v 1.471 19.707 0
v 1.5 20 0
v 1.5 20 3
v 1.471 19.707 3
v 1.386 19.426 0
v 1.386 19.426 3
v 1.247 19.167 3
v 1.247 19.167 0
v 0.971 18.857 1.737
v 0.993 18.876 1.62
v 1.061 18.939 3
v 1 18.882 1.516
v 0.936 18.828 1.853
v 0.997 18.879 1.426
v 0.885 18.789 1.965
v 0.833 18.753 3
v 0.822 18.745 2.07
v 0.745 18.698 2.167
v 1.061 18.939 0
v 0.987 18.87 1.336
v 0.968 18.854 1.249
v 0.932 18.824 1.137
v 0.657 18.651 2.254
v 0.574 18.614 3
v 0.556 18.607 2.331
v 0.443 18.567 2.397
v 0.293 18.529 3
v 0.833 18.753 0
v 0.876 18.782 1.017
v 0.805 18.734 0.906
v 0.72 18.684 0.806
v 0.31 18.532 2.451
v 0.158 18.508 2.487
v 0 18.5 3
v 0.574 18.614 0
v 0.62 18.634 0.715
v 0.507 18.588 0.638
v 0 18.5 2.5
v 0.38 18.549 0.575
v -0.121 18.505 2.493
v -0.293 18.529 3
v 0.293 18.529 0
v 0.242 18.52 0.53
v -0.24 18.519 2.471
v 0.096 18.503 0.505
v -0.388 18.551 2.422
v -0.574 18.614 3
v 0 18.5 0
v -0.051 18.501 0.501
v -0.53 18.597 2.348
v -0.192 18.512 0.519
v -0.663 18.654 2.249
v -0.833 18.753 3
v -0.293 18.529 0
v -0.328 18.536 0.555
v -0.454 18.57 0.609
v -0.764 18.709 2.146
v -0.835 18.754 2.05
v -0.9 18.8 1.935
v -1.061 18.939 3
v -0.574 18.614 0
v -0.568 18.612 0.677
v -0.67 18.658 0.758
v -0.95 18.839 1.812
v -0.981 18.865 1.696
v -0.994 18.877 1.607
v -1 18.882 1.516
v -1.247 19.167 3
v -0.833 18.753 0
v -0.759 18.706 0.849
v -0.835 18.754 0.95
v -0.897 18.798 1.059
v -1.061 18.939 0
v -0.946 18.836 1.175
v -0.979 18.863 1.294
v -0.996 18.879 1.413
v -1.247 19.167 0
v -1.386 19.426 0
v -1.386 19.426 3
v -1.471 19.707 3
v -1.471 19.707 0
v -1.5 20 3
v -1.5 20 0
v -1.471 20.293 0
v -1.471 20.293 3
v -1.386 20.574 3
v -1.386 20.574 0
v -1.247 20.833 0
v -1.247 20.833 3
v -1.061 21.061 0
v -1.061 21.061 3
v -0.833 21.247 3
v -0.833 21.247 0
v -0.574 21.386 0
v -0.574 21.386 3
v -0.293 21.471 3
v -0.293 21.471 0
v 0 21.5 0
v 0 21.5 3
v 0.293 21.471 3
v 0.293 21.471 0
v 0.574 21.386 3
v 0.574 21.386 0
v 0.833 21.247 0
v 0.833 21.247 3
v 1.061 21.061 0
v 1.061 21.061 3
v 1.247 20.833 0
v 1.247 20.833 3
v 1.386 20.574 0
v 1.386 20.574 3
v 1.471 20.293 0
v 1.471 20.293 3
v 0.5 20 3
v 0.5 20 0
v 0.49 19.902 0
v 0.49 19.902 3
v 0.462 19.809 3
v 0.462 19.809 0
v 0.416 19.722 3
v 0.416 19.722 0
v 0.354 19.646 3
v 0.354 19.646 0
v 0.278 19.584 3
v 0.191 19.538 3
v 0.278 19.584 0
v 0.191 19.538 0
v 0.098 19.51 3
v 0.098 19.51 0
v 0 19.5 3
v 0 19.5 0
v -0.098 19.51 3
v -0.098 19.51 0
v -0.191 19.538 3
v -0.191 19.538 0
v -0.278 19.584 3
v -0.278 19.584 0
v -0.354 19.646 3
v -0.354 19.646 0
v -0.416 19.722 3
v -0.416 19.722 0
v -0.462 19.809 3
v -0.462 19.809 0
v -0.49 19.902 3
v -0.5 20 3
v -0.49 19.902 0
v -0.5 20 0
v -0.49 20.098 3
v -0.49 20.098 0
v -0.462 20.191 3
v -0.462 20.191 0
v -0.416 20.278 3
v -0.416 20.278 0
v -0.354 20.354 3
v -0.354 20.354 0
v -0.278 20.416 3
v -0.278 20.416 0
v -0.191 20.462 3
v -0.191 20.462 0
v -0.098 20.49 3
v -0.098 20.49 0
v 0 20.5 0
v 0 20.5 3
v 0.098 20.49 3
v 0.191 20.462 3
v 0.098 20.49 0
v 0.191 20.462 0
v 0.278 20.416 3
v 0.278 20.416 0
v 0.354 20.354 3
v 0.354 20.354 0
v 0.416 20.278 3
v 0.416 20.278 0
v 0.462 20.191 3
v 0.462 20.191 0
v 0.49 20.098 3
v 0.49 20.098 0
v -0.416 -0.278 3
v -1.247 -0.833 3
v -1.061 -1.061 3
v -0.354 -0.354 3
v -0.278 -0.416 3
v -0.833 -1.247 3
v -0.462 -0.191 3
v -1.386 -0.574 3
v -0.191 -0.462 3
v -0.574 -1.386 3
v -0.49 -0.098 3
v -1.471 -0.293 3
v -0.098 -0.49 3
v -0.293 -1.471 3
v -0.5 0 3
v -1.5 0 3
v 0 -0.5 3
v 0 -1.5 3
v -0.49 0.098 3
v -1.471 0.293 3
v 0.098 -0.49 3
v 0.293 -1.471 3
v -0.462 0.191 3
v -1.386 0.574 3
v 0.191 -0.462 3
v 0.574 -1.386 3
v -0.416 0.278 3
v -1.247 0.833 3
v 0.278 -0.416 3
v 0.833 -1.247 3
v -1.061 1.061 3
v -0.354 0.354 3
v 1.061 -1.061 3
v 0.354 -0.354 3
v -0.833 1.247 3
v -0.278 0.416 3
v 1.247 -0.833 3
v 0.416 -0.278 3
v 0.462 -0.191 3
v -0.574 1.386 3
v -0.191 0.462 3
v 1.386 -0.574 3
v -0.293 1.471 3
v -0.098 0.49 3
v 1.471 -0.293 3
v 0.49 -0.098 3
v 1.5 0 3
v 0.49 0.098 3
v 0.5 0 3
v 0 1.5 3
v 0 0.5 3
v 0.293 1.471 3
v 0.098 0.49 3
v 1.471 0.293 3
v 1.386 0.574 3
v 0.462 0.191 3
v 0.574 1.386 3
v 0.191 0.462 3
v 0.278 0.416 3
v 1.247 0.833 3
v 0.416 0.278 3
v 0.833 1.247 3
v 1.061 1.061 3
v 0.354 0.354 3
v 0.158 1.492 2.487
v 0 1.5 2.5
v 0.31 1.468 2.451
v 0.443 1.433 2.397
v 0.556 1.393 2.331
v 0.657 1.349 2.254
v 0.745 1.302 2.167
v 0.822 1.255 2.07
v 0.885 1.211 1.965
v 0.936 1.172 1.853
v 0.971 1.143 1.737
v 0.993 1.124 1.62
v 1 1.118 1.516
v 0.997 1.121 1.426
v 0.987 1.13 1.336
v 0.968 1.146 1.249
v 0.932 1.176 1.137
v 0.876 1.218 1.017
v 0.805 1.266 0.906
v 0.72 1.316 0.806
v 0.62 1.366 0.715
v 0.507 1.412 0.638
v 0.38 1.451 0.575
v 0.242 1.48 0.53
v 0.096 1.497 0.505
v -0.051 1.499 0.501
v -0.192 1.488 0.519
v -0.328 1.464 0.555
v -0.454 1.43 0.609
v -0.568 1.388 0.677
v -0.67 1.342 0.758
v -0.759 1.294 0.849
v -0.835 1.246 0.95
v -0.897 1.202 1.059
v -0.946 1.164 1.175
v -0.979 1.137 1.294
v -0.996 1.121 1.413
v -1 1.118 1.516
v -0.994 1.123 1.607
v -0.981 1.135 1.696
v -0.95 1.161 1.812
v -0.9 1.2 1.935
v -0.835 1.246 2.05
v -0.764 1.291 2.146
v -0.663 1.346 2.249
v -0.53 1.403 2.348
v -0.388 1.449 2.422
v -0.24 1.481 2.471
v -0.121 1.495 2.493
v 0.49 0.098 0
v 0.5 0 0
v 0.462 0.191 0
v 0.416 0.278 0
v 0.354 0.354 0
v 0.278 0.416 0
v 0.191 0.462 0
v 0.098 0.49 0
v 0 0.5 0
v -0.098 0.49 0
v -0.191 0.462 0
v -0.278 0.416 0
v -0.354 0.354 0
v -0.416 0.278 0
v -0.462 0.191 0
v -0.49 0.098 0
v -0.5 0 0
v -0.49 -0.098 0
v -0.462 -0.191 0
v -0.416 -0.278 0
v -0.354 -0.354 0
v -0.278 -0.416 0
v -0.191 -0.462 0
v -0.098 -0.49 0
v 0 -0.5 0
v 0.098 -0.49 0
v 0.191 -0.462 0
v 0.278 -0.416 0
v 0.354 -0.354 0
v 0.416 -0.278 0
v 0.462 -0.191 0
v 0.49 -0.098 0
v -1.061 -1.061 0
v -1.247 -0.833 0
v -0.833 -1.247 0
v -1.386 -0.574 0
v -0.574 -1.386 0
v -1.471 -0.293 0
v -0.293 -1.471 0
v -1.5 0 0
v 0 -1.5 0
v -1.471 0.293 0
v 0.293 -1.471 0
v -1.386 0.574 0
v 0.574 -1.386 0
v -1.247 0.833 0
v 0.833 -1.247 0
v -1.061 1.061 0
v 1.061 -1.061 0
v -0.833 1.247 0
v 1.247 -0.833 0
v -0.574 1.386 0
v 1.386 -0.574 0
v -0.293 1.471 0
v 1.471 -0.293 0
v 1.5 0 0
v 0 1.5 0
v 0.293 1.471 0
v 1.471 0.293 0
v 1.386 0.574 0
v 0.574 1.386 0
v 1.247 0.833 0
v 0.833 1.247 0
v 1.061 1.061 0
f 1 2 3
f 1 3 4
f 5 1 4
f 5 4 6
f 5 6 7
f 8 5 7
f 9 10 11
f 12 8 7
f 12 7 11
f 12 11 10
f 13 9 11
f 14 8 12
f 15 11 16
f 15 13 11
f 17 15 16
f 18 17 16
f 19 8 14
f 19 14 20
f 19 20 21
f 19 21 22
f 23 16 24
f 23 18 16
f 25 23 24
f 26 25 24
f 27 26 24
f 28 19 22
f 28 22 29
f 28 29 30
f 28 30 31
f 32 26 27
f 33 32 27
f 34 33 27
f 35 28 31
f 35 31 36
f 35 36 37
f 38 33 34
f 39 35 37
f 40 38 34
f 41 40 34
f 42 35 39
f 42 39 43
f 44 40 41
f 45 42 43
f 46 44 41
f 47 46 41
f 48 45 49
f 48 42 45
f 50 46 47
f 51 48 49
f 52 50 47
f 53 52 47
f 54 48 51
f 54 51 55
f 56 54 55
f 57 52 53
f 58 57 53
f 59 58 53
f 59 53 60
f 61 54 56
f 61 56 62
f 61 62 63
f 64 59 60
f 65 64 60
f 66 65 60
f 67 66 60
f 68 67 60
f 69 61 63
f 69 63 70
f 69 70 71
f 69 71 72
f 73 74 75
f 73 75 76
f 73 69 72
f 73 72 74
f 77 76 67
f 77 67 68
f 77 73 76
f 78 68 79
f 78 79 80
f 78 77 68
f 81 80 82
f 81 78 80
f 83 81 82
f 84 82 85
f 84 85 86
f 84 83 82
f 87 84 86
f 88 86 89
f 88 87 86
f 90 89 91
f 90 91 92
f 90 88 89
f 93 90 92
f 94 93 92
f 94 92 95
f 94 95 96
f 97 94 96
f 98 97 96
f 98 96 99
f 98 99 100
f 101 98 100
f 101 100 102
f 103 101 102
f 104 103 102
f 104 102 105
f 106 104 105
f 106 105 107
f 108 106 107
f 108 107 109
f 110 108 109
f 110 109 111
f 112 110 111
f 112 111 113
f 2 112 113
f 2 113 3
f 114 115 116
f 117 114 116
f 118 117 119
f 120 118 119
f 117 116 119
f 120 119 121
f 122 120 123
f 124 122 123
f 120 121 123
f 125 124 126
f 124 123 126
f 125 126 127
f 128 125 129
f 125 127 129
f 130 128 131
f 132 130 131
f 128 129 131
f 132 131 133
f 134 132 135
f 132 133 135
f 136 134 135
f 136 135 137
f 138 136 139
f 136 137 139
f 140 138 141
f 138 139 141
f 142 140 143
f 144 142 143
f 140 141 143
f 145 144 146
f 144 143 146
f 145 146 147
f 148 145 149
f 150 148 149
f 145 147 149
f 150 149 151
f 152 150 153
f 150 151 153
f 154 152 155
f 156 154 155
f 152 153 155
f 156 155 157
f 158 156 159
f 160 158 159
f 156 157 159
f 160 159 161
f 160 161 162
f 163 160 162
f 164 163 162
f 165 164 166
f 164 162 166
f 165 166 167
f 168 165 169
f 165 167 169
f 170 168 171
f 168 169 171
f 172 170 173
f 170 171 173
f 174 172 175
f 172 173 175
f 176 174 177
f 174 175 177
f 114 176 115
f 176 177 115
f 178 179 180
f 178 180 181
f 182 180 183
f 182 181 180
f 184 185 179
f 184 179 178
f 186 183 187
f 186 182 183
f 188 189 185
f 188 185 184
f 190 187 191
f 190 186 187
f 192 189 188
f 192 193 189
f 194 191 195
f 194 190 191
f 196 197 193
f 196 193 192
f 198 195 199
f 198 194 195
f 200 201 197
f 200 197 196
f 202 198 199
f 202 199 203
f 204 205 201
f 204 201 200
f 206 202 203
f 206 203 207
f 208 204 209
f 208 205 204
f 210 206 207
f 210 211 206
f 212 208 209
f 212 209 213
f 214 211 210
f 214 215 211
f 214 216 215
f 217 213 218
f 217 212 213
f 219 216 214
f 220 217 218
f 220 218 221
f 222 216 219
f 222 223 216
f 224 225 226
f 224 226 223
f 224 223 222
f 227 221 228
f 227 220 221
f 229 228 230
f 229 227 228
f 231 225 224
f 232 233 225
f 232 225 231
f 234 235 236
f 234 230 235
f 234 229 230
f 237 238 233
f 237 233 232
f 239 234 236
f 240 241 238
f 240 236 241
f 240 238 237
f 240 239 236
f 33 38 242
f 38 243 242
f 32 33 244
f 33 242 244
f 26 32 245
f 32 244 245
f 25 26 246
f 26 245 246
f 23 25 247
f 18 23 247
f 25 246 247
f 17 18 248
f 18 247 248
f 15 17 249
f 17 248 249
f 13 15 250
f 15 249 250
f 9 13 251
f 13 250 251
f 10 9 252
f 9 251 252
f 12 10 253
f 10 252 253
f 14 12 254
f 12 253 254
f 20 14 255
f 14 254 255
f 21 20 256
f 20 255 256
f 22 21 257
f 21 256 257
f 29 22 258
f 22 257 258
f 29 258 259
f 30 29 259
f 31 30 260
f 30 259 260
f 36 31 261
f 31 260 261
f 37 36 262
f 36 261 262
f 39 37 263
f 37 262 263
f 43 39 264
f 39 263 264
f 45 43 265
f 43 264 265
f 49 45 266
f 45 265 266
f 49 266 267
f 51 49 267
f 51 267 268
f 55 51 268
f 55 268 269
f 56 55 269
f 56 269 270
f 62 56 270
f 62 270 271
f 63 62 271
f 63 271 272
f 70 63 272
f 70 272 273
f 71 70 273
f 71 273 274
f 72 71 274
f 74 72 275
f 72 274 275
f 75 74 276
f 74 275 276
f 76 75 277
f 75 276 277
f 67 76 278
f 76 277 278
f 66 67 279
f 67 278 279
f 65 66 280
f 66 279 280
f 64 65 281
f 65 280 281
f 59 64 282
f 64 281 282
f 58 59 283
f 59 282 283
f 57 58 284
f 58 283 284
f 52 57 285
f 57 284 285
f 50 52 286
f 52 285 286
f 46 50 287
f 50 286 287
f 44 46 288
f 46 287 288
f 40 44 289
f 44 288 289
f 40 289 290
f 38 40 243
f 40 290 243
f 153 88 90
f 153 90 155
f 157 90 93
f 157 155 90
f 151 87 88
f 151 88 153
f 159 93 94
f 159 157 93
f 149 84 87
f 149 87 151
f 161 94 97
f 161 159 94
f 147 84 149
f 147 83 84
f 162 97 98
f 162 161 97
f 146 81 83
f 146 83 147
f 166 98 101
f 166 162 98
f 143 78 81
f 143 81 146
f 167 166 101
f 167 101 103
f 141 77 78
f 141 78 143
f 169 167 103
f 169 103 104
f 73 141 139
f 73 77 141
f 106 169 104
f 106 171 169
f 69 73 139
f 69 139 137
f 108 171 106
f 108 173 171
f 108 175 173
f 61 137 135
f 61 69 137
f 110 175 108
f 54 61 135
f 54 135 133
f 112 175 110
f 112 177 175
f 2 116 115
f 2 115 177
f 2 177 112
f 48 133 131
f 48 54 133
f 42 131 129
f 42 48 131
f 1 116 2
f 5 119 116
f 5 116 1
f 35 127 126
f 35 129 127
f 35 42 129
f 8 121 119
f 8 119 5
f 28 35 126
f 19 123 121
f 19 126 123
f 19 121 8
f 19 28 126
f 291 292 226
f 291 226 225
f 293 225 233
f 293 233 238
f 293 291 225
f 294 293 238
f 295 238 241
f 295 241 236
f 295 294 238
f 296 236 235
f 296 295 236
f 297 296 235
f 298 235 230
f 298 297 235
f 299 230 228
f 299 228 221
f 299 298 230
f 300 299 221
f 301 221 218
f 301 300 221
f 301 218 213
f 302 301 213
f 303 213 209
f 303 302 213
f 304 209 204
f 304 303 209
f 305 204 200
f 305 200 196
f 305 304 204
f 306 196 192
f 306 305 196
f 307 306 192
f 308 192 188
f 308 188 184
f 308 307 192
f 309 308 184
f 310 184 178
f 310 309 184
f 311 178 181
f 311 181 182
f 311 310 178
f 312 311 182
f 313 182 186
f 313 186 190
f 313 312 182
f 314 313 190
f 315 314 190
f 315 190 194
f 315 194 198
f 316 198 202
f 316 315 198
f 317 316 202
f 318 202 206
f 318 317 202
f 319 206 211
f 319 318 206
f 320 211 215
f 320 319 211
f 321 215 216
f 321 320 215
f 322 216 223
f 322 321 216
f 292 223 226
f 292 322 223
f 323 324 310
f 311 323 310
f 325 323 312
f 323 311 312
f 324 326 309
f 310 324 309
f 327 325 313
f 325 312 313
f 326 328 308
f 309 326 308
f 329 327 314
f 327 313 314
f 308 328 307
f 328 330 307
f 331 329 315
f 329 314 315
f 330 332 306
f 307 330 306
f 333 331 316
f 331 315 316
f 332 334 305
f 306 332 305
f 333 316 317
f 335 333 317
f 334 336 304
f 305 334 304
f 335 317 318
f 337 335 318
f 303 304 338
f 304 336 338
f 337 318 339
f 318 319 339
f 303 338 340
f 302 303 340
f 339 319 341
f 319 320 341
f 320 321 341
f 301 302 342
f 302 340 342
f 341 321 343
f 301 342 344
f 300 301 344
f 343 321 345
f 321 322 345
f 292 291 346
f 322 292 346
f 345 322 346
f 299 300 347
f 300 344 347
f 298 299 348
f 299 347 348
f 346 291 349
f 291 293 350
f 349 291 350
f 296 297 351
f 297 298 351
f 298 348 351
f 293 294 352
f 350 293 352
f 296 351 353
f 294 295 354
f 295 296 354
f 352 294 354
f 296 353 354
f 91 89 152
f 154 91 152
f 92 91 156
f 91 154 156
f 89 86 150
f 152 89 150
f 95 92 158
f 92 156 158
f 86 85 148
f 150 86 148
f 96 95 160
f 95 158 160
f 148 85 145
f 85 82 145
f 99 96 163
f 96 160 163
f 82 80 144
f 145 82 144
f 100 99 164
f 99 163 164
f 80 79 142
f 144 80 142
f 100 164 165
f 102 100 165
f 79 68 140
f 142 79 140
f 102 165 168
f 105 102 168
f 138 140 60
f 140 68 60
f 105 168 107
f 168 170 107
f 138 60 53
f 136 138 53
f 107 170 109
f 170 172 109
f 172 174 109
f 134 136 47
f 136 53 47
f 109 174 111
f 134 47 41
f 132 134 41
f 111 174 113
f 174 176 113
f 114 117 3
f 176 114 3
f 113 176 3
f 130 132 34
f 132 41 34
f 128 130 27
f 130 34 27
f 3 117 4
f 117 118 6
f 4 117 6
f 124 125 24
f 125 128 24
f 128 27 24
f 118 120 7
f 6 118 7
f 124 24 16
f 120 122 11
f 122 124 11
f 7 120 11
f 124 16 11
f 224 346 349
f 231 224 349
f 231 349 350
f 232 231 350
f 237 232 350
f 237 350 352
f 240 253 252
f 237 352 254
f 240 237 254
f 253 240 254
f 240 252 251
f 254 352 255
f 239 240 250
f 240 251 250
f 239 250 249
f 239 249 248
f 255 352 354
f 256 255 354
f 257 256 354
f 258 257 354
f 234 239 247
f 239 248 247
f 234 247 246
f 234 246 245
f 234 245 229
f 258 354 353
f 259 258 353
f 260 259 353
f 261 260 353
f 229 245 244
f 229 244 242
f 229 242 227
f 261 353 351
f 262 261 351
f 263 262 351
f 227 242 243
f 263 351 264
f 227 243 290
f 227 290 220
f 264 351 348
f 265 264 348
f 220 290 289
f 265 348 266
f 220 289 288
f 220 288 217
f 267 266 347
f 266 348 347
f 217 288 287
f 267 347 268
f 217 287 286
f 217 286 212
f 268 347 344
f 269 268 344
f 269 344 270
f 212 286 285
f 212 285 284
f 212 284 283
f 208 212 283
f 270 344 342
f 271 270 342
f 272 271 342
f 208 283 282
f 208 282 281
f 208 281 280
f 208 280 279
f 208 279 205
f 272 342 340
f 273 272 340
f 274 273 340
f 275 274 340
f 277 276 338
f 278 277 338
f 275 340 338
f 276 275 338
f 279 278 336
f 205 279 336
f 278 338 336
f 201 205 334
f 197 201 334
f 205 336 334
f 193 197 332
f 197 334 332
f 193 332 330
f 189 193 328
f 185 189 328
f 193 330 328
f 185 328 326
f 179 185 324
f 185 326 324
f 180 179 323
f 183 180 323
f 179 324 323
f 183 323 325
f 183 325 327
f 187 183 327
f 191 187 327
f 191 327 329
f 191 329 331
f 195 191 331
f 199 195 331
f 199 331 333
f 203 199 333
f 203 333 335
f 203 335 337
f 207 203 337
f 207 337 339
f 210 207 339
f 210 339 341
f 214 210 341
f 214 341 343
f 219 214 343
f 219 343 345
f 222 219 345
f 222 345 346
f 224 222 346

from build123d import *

# Parameters (mm, degrees)
SKETCH_1_R           = 1.5
SKETCH_1_R_2         = 0.5
EXTRUDE_1_DEPTH      = 3
EXTRUDE_2_REACH      = 13.979
EXTRUDE_2_END_RADIUS = 1.5
SKETCH_2_R           = 1


with BuildPart() as part:
    # 草图1 → 凸台-拉伸1 (new body)
    with BuildSketch(Plane.XY):
        Circle(SKETCH_1_R)
        Circle(SKETCH_1_R_2, mode=Mode.SUBTRACT)
    extrude_1 = extrude(amount=EXTRUDE_1_DEPTH)

    # 凸台-拉伸2: up to this cylinder (the profile starts outside it)
    extrude_2_end = Plane(origin=(0, 0, 1.5), z_dir=(0, 0, -1)) * Cylinder(EXTRUDE_2_END_RADIUS, 31.958, mode=Mode.PRIVATE)
    # 草图2 → 凸台-拉伸2 (add, up to the surface)
    with BuildSketch(Plane(origin=(0, 10, 0), x_dir=(1, 0, 0), z_dir=(0, 1, 0)), mode=Mode.PRIVATE) as extrude_2_sk1:
        with Locations(Location((0, -1.5, 0), (0, 0, 270))):
            Circle(SKETCH_2_R)
    extrude_2_tool1 = extrude(extrude_2_sk1.sketch, amount=-EXTRUDE_2_REACH, mode=Mode.PRIVATE) - extrude_2_end
    extrude_2 = extrude_2_tool1.solids().sort_by_distance((0, 10, 1.5))[0]
    add(extrude_2)

    # 镜向1: 凸台-拉伸2 across plane
    add(extrude_2.mirror(Plane.ZX.offset(10)))

    # 镜向2: 凸台-拉伸1 across plane
    add(extrude_1.mirror(Plane.ZX.offset(10)))


solid = part.part
